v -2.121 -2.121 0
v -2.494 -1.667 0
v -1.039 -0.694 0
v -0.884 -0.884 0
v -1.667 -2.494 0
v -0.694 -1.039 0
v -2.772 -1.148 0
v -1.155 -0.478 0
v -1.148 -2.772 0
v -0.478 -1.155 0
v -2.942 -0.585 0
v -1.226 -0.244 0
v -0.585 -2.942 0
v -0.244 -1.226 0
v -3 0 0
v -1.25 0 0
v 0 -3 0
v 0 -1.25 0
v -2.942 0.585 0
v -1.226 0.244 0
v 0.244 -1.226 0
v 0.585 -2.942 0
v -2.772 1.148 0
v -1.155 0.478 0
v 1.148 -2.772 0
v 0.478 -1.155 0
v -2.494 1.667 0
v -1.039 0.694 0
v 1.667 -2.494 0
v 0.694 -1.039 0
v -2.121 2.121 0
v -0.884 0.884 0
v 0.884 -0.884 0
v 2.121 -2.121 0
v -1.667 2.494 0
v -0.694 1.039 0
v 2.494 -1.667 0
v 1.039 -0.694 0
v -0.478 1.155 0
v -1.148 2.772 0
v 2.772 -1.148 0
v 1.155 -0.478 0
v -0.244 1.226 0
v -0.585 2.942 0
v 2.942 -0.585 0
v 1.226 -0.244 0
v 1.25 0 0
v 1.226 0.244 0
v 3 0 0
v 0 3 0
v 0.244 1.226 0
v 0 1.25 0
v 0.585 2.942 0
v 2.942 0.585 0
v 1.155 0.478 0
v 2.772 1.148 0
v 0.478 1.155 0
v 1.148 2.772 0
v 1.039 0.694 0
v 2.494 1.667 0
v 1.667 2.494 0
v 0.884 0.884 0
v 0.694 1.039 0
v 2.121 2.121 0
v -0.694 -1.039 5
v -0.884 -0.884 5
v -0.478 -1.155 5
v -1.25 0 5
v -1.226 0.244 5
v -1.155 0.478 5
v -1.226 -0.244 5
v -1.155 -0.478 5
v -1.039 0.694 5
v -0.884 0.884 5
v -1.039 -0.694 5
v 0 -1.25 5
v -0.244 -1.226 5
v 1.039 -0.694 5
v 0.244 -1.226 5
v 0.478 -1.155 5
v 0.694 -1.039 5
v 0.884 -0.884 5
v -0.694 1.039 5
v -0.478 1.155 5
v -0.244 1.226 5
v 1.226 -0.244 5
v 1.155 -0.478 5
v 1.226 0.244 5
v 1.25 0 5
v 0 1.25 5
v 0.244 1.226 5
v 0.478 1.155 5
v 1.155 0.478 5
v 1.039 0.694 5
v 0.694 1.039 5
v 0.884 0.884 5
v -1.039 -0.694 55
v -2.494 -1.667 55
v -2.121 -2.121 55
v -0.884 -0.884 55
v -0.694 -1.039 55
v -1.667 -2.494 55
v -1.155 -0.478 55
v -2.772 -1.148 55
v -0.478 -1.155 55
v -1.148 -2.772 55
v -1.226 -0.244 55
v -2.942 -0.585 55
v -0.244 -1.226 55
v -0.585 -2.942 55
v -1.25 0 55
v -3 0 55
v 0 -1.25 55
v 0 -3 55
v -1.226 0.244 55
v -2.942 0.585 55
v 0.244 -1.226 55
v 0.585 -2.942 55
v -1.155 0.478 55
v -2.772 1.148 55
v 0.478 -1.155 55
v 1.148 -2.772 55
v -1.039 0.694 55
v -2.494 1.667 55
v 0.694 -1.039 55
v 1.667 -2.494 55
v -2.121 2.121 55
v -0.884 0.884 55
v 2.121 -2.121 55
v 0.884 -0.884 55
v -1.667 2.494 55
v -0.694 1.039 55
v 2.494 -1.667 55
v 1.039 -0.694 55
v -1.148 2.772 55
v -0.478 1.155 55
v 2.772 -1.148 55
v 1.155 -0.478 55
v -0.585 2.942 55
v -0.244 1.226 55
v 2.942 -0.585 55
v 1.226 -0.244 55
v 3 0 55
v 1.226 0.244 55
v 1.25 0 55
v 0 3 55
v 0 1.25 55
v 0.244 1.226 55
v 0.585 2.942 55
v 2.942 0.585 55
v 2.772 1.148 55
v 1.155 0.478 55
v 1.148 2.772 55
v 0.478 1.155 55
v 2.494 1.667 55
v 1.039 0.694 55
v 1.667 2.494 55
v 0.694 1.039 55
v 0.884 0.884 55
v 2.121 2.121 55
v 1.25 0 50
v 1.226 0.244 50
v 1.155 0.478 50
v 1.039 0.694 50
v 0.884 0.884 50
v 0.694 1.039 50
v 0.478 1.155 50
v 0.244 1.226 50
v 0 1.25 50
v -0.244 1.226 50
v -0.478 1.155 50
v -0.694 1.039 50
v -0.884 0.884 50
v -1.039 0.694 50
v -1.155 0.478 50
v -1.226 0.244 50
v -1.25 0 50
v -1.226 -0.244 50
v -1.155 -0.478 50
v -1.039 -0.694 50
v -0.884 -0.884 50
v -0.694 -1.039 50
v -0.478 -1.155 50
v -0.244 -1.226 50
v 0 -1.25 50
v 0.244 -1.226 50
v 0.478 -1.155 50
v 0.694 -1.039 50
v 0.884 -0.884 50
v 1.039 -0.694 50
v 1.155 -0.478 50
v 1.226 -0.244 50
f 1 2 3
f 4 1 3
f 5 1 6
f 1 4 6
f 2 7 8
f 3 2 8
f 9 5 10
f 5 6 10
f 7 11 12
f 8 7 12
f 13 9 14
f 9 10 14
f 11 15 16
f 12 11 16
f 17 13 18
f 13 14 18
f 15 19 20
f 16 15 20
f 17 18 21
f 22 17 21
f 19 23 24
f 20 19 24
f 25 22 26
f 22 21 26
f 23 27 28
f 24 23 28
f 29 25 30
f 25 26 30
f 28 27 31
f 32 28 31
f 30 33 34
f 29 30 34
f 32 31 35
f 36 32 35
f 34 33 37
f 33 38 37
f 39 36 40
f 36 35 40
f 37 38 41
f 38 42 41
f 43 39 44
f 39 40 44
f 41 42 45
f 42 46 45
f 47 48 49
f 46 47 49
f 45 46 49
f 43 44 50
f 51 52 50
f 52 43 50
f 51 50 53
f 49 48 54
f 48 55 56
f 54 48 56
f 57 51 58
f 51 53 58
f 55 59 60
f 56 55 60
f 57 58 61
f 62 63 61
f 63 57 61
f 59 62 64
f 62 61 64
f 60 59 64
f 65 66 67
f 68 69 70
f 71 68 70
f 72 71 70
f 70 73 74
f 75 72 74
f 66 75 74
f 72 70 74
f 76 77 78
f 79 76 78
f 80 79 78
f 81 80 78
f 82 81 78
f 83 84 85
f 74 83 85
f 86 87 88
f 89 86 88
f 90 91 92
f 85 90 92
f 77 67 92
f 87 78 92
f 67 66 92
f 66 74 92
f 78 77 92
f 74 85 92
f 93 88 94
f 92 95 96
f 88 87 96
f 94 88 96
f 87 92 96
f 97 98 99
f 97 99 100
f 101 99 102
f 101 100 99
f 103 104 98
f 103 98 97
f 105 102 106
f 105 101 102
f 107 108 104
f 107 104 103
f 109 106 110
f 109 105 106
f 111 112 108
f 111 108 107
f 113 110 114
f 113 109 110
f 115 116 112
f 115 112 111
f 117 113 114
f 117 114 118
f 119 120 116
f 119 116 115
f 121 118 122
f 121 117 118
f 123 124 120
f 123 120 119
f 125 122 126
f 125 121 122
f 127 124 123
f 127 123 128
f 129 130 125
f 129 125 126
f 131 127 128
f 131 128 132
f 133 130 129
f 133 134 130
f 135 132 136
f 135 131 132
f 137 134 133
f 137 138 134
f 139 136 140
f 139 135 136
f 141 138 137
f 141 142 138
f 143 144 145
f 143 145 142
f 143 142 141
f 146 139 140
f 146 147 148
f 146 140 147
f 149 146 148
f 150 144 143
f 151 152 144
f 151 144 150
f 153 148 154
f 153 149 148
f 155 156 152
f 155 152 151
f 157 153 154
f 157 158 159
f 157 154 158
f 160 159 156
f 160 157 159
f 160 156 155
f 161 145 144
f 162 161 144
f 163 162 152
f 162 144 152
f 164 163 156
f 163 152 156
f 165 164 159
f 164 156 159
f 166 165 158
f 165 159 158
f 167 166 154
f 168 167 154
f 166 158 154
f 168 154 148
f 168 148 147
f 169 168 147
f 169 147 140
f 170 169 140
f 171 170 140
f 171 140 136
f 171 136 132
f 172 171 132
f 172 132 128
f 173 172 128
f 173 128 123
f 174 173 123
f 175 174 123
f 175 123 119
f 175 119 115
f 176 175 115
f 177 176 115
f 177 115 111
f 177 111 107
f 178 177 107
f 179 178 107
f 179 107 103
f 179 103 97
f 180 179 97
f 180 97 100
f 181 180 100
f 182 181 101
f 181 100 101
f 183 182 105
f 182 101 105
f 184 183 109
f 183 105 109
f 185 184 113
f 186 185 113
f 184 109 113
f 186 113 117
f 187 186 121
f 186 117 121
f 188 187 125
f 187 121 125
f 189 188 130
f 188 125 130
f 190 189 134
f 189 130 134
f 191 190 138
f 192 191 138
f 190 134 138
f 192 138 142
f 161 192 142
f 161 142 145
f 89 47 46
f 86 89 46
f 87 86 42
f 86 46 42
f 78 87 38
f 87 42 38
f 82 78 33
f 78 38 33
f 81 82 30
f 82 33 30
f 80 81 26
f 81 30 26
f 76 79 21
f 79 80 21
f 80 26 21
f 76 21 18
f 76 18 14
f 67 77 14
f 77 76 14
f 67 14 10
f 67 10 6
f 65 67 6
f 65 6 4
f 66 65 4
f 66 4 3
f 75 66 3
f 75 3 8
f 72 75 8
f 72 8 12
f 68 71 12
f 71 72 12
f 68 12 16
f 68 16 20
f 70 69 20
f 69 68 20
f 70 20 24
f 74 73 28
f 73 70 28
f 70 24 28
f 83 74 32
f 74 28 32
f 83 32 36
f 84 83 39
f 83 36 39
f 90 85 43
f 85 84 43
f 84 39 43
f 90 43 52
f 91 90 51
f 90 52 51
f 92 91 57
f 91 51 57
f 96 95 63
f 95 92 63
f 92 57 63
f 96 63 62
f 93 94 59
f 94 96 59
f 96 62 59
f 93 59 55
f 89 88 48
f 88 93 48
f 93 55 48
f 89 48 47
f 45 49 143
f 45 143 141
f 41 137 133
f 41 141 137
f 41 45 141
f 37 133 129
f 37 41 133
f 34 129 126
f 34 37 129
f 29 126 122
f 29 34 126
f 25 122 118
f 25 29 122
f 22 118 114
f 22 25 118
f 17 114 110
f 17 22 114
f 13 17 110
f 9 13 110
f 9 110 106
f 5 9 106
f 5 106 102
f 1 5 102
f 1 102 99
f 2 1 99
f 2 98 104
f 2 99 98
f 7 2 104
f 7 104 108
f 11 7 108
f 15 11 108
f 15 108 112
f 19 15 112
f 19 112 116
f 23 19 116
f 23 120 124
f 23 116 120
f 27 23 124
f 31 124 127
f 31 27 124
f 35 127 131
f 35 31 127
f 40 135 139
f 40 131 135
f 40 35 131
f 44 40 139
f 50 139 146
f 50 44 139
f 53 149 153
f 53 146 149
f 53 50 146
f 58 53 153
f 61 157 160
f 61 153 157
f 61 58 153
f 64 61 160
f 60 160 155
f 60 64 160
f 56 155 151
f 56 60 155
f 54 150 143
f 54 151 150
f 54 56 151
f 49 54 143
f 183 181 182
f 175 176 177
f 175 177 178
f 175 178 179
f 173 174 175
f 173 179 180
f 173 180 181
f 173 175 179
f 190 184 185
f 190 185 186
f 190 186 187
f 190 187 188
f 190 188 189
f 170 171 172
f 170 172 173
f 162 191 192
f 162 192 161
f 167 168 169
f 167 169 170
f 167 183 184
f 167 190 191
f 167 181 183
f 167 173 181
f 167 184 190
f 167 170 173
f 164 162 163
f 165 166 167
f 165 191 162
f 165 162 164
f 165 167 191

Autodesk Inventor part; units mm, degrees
ref_plane "YZ Plane" through (0, 0, 0) normal (1, 0, 0) x (0, 1, 0)
ref_plane "XZ Plane" through (0, 0, 0) normal (0, 1, 0) x (-1, 0, 0)
ref_plane "XY Plane" through (0, 0, 0) normal (0, 0, 1) x (1, 0, 0)
sketch "スケッチ1" plane through (0, 0, 0) normal (0, 0, 1) x (1, 0, 0)
  circle A0 centre (0, 0) radius 3
  circle A1 centre (0, 0) radius 1.25
  dimension "d0" = 6
  dimension "d1" = 2.5
extrude "押し出し1" add sketch "スケッチ1" along normal blind 55 contours A0 | A1
sketch "スケッチ2" plane through (0, 0, 55) normal (0, 0, 1) x (1, 0, 0)
  circle A0 centre (0, 0) radius 3 projected
  circle A1 centre (0, 0) radius 1.25
  dimension "d4" = 2.5
extrude "押し出し2" cut sketch "スケッチ2" against normal blind 5 contours A1
extrude "押し出し3" cut sketch "スケッチ1" along normal blind 5 contours A1
properties part number "50mm" material "アルミニウム 2014-T4"
